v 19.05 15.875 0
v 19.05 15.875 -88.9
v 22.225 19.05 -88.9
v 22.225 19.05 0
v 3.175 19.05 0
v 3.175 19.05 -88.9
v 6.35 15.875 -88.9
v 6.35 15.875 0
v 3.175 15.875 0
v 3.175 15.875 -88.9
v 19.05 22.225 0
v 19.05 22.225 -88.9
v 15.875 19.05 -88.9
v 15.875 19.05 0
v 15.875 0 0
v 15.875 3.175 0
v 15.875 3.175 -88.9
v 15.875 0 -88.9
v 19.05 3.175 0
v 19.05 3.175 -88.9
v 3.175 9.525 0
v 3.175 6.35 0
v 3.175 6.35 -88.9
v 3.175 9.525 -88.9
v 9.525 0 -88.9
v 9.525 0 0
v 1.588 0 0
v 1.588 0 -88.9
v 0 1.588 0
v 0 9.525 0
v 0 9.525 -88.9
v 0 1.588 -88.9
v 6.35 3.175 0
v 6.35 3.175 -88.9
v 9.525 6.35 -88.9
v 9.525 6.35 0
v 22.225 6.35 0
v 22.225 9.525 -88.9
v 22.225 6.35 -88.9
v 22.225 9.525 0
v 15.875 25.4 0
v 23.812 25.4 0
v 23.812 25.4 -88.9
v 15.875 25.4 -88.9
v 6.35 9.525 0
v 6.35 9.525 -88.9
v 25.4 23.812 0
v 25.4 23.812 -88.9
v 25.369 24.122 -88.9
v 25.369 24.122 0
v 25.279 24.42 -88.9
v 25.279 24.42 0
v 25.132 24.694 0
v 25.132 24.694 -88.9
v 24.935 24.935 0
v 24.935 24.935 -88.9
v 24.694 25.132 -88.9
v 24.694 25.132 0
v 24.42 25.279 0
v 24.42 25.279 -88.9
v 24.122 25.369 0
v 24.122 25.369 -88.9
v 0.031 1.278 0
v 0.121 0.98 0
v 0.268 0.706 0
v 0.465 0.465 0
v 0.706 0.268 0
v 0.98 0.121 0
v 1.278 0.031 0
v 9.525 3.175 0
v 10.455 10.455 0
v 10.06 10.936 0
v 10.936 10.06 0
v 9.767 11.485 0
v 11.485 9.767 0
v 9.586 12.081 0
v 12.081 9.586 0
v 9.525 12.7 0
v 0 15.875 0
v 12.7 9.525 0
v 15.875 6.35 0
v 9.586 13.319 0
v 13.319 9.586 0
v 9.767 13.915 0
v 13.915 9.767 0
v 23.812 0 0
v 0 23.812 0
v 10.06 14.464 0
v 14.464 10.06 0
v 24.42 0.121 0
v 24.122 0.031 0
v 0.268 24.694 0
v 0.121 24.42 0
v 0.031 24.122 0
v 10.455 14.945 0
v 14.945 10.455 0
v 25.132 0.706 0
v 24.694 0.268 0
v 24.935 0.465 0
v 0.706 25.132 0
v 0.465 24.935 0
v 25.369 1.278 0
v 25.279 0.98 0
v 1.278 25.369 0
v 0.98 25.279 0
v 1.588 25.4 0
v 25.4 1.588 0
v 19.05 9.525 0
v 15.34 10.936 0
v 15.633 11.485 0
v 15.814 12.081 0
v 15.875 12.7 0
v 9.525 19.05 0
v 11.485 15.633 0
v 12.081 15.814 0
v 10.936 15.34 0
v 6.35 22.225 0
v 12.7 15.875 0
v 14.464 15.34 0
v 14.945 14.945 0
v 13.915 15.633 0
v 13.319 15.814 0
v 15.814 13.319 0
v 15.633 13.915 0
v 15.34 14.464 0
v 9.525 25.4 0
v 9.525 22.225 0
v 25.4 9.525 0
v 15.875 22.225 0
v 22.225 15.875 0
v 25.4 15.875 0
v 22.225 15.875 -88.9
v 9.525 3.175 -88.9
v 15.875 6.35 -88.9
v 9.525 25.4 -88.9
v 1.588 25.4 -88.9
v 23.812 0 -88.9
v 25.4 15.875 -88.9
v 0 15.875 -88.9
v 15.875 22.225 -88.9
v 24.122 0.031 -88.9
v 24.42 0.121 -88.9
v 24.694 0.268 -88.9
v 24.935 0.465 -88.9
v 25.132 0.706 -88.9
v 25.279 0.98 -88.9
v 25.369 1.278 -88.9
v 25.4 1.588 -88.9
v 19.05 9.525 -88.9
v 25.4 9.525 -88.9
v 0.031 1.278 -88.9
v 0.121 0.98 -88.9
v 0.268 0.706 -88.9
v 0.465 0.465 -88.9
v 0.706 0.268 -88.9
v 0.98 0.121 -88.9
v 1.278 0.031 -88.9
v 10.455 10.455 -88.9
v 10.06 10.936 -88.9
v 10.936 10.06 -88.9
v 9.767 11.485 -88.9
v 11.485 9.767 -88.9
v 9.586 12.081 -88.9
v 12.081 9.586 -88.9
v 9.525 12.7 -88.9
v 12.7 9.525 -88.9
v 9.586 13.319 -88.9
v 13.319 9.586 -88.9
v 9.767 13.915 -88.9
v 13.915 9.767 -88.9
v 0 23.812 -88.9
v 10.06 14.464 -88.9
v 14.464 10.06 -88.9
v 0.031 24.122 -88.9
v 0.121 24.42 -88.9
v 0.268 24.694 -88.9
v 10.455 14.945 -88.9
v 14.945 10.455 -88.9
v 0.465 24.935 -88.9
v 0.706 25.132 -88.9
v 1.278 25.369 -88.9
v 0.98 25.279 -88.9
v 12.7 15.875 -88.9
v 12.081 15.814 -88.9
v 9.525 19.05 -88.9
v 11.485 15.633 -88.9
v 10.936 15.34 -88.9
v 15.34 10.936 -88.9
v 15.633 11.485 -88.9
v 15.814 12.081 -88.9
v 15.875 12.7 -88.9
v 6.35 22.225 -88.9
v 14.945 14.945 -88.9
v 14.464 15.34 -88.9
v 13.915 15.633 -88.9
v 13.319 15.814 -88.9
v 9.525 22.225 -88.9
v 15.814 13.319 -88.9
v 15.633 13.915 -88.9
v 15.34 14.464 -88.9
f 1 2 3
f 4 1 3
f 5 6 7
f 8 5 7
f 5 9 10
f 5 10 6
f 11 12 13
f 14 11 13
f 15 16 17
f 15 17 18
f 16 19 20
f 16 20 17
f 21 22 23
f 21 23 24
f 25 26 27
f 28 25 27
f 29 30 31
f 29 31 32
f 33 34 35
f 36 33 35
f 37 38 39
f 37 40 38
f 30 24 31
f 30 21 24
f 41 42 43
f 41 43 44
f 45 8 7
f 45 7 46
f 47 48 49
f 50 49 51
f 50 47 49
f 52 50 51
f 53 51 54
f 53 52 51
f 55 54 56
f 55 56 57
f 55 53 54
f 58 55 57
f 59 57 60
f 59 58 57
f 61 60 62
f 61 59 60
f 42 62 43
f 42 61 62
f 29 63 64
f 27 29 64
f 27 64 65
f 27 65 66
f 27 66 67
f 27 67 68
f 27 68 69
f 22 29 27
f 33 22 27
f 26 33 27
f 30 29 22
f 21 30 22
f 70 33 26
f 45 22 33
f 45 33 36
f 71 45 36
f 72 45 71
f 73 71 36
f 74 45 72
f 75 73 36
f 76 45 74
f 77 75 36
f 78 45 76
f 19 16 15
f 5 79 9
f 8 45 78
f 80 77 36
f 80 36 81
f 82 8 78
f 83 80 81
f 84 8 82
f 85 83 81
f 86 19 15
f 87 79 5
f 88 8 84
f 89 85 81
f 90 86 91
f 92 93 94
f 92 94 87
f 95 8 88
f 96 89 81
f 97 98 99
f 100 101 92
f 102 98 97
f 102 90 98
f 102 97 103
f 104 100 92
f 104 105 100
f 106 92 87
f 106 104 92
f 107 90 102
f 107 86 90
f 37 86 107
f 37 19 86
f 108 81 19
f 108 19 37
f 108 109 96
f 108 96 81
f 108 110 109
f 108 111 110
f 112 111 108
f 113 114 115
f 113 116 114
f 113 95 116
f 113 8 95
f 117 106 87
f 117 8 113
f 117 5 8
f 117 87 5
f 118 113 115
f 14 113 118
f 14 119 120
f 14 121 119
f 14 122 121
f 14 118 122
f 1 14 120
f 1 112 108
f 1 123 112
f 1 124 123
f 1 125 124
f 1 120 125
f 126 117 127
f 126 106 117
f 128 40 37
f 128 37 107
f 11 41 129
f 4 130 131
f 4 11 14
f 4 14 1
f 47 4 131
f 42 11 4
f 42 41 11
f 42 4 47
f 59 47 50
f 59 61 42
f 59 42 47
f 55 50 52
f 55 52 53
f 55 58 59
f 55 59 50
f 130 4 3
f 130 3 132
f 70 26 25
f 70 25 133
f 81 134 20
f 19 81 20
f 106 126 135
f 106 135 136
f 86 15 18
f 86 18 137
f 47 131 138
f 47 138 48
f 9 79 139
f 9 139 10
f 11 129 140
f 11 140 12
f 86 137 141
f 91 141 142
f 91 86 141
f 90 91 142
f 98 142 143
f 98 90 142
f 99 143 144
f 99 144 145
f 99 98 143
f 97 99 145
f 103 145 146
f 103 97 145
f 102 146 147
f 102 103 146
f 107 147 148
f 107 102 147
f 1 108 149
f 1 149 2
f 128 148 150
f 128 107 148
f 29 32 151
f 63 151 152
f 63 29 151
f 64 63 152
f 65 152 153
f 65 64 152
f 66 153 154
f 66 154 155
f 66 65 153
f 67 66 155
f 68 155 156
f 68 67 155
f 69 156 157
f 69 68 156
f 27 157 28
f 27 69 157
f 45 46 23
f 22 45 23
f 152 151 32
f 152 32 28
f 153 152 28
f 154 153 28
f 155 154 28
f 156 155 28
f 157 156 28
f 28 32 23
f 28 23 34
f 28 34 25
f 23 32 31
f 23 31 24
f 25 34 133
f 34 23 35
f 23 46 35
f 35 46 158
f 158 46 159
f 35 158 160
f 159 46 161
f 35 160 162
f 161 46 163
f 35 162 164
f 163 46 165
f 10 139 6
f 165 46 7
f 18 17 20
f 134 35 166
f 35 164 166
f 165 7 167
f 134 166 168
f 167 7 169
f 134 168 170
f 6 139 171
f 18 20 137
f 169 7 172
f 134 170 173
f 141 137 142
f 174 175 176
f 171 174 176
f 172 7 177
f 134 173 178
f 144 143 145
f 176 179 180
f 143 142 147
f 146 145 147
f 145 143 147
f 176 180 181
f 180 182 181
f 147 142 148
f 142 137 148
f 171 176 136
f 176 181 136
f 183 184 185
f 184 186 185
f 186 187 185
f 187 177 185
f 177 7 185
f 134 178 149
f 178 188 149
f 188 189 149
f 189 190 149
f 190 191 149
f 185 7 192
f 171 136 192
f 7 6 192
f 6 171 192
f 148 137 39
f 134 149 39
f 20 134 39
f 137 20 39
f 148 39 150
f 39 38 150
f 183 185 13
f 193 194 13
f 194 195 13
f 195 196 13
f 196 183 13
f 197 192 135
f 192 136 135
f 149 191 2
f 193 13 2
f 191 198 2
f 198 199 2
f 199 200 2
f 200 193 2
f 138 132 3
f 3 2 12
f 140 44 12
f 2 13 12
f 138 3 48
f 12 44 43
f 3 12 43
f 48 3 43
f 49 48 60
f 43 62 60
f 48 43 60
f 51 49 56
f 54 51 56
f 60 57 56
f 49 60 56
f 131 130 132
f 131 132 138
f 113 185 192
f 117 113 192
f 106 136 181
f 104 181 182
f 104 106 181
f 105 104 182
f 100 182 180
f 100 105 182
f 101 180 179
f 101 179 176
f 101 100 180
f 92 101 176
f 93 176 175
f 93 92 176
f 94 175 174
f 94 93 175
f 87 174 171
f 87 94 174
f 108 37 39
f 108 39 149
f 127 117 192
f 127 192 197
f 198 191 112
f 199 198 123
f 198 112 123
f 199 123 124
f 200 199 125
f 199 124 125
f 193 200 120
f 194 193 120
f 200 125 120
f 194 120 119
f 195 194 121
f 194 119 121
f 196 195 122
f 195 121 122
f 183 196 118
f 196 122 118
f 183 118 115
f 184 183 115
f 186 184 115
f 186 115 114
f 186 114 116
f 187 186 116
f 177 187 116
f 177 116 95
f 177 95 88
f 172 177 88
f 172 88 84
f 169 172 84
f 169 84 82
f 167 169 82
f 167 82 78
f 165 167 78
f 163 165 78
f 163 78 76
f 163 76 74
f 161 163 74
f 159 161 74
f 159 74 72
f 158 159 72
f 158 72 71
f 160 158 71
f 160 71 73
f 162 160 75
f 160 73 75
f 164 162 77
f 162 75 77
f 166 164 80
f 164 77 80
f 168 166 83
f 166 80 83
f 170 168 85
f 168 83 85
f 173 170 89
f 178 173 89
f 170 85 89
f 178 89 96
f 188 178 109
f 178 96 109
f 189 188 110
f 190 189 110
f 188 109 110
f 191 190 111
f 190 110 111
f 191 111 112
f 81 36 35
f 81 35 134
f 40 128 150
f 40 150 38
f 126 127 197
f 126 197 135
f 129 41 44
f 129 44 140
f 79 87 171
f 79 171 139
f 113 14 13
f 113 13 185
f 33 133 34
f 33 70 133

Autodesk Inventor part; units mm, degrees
ref_plane "YZ Plane" through (0, 0, 0) normal (1, 0, 0) x (0, 1, 0)
ref_plane "XZ Plane" through (0, 0, 0) normal (0, 1, 0) x (-1, 0, 0)
ref_plane "XY Plane" through (0, 0, 0) normal (0, 0, 1) x (1, 0, 0)
sketch "Sketch1" plane through (0, 0, 0) normal (0, 0, 1) x (1, 0, 0)
  line L0 (0, 15.875) -> (3.175, 15.875)
  line L1 (3.175, 15.875) -> (3.175, 19.05)
  line L2 (3.175, 19.05) -> (6.35, 15.875)
  line L3 (6.35, 15.875) -> (6.35, 9.525)
  line L4 (6.35, 9.525) -> (3.175, 6.35)
  line L5 (3.175, 6.35) -> (3.175, 9.525)
  line L6 (3.175, 9.525) -> (0, 9.525)
  line L7 (9.525, 0) -> (9.525, 3.175)
  line L8 (9.525, 3.175) -> (6.35, 3.175)
  line L9 (6.35, 3.175) -> (9.525, 6.35)
  line L10 (9.525, 6.35) -> (15.875, 6.35)
  line L11 (15.875, 6.35) -> (19.05, 3.175)
  line L12 (19.05, 3.175) -> (15.875, 3.175)
  line L13 (15.875, 3.175) -> (15.875, 0)
  line L14 (25.4, 9.525) -> (22.225, 9.525)
  line L15 (22.225, 9.525) -> (22.225, 6.35)
  line L16 (22.225, 6.35) -> (19.05, 9.525)
  line L17 (19.05, 9.525) -> (19.05, 15.875)
  line L18 (19.05, 15.875) -> (22.225, 19.05)
  line L19 (22.225, 19.05) -> (22.225, 15.875)
  line L20 (22.225, 15.875) -> (25.4, 15.875)
  line L21 (15.875, 25.4) -> (15.875, 22.225)
  line L22 (15.875, 22.225) -> (19.05, 22.225)
  line L23 (19.05, 22.225) -> (15.875, 19.05)
  line L24 (15.875, 19.05) -> (9.525, 19.05)
  line L25 (9.525, 19.05) -> (6.35, 22.225)
  line L26 (6.35, 22.225) -> (9.525, 22.225)
  line L27 (9.525, 22.225) -> (9.525, 25.4)
  circle A0 centre (12.7, 12.7) radius 3.175
  line L28 (0, 23.8125) -> (0, 15.875)
  line L29 (0, 9.525) -> (0, 1.5875)
  line L30 (9.525, 0) -> (1.5875, 0)
  line L31 (15.875, 0) -> (23.8125, 0)
  line L32 (25.4, 1.5875) -> (25.4, 9.525)
  line L33 (25.4, 15.875) -> (25.4, 23.8125)
  line L34 (23.8125, 25.4) -> (15.875, 25.4)
  line L35 (9.525, 25.4) -> (1.5875, 25.4)
  arc A1 (0, 1.5875) -> (1.5875, 0) centre (1.5875, 1.5875) ccw
  arc A2 (1.5875, 25.4) -> (0, 23.8125) centre (1.5875, 23.8125) ccw
  arc A3 (25.4, 23.8125) -> (23.8125, 25.4) centre (23.8125, 23.8125) ccw
  arc A4 (23.8125, 0) -> (25.4, 1.5875) centre (23.8125, 1.5875) ccw
  point P0 (0, 0)
  point P1 (25.4, 0)
  point P2 (0, 25.4)
  dimension "d5" = 6.35
  dimension "d7" = 12.7
  dimension "d8" = 3.175
  dimension "d9" = 3.175
  dimension "d13" = 360
  dimension "d15" = 6.35
  dimension "d16" = 1.5875
extrude "Extrusion2" add sketch "Sketch1" against normal blind 88.9
properties part number "5 in shooter standoff"
